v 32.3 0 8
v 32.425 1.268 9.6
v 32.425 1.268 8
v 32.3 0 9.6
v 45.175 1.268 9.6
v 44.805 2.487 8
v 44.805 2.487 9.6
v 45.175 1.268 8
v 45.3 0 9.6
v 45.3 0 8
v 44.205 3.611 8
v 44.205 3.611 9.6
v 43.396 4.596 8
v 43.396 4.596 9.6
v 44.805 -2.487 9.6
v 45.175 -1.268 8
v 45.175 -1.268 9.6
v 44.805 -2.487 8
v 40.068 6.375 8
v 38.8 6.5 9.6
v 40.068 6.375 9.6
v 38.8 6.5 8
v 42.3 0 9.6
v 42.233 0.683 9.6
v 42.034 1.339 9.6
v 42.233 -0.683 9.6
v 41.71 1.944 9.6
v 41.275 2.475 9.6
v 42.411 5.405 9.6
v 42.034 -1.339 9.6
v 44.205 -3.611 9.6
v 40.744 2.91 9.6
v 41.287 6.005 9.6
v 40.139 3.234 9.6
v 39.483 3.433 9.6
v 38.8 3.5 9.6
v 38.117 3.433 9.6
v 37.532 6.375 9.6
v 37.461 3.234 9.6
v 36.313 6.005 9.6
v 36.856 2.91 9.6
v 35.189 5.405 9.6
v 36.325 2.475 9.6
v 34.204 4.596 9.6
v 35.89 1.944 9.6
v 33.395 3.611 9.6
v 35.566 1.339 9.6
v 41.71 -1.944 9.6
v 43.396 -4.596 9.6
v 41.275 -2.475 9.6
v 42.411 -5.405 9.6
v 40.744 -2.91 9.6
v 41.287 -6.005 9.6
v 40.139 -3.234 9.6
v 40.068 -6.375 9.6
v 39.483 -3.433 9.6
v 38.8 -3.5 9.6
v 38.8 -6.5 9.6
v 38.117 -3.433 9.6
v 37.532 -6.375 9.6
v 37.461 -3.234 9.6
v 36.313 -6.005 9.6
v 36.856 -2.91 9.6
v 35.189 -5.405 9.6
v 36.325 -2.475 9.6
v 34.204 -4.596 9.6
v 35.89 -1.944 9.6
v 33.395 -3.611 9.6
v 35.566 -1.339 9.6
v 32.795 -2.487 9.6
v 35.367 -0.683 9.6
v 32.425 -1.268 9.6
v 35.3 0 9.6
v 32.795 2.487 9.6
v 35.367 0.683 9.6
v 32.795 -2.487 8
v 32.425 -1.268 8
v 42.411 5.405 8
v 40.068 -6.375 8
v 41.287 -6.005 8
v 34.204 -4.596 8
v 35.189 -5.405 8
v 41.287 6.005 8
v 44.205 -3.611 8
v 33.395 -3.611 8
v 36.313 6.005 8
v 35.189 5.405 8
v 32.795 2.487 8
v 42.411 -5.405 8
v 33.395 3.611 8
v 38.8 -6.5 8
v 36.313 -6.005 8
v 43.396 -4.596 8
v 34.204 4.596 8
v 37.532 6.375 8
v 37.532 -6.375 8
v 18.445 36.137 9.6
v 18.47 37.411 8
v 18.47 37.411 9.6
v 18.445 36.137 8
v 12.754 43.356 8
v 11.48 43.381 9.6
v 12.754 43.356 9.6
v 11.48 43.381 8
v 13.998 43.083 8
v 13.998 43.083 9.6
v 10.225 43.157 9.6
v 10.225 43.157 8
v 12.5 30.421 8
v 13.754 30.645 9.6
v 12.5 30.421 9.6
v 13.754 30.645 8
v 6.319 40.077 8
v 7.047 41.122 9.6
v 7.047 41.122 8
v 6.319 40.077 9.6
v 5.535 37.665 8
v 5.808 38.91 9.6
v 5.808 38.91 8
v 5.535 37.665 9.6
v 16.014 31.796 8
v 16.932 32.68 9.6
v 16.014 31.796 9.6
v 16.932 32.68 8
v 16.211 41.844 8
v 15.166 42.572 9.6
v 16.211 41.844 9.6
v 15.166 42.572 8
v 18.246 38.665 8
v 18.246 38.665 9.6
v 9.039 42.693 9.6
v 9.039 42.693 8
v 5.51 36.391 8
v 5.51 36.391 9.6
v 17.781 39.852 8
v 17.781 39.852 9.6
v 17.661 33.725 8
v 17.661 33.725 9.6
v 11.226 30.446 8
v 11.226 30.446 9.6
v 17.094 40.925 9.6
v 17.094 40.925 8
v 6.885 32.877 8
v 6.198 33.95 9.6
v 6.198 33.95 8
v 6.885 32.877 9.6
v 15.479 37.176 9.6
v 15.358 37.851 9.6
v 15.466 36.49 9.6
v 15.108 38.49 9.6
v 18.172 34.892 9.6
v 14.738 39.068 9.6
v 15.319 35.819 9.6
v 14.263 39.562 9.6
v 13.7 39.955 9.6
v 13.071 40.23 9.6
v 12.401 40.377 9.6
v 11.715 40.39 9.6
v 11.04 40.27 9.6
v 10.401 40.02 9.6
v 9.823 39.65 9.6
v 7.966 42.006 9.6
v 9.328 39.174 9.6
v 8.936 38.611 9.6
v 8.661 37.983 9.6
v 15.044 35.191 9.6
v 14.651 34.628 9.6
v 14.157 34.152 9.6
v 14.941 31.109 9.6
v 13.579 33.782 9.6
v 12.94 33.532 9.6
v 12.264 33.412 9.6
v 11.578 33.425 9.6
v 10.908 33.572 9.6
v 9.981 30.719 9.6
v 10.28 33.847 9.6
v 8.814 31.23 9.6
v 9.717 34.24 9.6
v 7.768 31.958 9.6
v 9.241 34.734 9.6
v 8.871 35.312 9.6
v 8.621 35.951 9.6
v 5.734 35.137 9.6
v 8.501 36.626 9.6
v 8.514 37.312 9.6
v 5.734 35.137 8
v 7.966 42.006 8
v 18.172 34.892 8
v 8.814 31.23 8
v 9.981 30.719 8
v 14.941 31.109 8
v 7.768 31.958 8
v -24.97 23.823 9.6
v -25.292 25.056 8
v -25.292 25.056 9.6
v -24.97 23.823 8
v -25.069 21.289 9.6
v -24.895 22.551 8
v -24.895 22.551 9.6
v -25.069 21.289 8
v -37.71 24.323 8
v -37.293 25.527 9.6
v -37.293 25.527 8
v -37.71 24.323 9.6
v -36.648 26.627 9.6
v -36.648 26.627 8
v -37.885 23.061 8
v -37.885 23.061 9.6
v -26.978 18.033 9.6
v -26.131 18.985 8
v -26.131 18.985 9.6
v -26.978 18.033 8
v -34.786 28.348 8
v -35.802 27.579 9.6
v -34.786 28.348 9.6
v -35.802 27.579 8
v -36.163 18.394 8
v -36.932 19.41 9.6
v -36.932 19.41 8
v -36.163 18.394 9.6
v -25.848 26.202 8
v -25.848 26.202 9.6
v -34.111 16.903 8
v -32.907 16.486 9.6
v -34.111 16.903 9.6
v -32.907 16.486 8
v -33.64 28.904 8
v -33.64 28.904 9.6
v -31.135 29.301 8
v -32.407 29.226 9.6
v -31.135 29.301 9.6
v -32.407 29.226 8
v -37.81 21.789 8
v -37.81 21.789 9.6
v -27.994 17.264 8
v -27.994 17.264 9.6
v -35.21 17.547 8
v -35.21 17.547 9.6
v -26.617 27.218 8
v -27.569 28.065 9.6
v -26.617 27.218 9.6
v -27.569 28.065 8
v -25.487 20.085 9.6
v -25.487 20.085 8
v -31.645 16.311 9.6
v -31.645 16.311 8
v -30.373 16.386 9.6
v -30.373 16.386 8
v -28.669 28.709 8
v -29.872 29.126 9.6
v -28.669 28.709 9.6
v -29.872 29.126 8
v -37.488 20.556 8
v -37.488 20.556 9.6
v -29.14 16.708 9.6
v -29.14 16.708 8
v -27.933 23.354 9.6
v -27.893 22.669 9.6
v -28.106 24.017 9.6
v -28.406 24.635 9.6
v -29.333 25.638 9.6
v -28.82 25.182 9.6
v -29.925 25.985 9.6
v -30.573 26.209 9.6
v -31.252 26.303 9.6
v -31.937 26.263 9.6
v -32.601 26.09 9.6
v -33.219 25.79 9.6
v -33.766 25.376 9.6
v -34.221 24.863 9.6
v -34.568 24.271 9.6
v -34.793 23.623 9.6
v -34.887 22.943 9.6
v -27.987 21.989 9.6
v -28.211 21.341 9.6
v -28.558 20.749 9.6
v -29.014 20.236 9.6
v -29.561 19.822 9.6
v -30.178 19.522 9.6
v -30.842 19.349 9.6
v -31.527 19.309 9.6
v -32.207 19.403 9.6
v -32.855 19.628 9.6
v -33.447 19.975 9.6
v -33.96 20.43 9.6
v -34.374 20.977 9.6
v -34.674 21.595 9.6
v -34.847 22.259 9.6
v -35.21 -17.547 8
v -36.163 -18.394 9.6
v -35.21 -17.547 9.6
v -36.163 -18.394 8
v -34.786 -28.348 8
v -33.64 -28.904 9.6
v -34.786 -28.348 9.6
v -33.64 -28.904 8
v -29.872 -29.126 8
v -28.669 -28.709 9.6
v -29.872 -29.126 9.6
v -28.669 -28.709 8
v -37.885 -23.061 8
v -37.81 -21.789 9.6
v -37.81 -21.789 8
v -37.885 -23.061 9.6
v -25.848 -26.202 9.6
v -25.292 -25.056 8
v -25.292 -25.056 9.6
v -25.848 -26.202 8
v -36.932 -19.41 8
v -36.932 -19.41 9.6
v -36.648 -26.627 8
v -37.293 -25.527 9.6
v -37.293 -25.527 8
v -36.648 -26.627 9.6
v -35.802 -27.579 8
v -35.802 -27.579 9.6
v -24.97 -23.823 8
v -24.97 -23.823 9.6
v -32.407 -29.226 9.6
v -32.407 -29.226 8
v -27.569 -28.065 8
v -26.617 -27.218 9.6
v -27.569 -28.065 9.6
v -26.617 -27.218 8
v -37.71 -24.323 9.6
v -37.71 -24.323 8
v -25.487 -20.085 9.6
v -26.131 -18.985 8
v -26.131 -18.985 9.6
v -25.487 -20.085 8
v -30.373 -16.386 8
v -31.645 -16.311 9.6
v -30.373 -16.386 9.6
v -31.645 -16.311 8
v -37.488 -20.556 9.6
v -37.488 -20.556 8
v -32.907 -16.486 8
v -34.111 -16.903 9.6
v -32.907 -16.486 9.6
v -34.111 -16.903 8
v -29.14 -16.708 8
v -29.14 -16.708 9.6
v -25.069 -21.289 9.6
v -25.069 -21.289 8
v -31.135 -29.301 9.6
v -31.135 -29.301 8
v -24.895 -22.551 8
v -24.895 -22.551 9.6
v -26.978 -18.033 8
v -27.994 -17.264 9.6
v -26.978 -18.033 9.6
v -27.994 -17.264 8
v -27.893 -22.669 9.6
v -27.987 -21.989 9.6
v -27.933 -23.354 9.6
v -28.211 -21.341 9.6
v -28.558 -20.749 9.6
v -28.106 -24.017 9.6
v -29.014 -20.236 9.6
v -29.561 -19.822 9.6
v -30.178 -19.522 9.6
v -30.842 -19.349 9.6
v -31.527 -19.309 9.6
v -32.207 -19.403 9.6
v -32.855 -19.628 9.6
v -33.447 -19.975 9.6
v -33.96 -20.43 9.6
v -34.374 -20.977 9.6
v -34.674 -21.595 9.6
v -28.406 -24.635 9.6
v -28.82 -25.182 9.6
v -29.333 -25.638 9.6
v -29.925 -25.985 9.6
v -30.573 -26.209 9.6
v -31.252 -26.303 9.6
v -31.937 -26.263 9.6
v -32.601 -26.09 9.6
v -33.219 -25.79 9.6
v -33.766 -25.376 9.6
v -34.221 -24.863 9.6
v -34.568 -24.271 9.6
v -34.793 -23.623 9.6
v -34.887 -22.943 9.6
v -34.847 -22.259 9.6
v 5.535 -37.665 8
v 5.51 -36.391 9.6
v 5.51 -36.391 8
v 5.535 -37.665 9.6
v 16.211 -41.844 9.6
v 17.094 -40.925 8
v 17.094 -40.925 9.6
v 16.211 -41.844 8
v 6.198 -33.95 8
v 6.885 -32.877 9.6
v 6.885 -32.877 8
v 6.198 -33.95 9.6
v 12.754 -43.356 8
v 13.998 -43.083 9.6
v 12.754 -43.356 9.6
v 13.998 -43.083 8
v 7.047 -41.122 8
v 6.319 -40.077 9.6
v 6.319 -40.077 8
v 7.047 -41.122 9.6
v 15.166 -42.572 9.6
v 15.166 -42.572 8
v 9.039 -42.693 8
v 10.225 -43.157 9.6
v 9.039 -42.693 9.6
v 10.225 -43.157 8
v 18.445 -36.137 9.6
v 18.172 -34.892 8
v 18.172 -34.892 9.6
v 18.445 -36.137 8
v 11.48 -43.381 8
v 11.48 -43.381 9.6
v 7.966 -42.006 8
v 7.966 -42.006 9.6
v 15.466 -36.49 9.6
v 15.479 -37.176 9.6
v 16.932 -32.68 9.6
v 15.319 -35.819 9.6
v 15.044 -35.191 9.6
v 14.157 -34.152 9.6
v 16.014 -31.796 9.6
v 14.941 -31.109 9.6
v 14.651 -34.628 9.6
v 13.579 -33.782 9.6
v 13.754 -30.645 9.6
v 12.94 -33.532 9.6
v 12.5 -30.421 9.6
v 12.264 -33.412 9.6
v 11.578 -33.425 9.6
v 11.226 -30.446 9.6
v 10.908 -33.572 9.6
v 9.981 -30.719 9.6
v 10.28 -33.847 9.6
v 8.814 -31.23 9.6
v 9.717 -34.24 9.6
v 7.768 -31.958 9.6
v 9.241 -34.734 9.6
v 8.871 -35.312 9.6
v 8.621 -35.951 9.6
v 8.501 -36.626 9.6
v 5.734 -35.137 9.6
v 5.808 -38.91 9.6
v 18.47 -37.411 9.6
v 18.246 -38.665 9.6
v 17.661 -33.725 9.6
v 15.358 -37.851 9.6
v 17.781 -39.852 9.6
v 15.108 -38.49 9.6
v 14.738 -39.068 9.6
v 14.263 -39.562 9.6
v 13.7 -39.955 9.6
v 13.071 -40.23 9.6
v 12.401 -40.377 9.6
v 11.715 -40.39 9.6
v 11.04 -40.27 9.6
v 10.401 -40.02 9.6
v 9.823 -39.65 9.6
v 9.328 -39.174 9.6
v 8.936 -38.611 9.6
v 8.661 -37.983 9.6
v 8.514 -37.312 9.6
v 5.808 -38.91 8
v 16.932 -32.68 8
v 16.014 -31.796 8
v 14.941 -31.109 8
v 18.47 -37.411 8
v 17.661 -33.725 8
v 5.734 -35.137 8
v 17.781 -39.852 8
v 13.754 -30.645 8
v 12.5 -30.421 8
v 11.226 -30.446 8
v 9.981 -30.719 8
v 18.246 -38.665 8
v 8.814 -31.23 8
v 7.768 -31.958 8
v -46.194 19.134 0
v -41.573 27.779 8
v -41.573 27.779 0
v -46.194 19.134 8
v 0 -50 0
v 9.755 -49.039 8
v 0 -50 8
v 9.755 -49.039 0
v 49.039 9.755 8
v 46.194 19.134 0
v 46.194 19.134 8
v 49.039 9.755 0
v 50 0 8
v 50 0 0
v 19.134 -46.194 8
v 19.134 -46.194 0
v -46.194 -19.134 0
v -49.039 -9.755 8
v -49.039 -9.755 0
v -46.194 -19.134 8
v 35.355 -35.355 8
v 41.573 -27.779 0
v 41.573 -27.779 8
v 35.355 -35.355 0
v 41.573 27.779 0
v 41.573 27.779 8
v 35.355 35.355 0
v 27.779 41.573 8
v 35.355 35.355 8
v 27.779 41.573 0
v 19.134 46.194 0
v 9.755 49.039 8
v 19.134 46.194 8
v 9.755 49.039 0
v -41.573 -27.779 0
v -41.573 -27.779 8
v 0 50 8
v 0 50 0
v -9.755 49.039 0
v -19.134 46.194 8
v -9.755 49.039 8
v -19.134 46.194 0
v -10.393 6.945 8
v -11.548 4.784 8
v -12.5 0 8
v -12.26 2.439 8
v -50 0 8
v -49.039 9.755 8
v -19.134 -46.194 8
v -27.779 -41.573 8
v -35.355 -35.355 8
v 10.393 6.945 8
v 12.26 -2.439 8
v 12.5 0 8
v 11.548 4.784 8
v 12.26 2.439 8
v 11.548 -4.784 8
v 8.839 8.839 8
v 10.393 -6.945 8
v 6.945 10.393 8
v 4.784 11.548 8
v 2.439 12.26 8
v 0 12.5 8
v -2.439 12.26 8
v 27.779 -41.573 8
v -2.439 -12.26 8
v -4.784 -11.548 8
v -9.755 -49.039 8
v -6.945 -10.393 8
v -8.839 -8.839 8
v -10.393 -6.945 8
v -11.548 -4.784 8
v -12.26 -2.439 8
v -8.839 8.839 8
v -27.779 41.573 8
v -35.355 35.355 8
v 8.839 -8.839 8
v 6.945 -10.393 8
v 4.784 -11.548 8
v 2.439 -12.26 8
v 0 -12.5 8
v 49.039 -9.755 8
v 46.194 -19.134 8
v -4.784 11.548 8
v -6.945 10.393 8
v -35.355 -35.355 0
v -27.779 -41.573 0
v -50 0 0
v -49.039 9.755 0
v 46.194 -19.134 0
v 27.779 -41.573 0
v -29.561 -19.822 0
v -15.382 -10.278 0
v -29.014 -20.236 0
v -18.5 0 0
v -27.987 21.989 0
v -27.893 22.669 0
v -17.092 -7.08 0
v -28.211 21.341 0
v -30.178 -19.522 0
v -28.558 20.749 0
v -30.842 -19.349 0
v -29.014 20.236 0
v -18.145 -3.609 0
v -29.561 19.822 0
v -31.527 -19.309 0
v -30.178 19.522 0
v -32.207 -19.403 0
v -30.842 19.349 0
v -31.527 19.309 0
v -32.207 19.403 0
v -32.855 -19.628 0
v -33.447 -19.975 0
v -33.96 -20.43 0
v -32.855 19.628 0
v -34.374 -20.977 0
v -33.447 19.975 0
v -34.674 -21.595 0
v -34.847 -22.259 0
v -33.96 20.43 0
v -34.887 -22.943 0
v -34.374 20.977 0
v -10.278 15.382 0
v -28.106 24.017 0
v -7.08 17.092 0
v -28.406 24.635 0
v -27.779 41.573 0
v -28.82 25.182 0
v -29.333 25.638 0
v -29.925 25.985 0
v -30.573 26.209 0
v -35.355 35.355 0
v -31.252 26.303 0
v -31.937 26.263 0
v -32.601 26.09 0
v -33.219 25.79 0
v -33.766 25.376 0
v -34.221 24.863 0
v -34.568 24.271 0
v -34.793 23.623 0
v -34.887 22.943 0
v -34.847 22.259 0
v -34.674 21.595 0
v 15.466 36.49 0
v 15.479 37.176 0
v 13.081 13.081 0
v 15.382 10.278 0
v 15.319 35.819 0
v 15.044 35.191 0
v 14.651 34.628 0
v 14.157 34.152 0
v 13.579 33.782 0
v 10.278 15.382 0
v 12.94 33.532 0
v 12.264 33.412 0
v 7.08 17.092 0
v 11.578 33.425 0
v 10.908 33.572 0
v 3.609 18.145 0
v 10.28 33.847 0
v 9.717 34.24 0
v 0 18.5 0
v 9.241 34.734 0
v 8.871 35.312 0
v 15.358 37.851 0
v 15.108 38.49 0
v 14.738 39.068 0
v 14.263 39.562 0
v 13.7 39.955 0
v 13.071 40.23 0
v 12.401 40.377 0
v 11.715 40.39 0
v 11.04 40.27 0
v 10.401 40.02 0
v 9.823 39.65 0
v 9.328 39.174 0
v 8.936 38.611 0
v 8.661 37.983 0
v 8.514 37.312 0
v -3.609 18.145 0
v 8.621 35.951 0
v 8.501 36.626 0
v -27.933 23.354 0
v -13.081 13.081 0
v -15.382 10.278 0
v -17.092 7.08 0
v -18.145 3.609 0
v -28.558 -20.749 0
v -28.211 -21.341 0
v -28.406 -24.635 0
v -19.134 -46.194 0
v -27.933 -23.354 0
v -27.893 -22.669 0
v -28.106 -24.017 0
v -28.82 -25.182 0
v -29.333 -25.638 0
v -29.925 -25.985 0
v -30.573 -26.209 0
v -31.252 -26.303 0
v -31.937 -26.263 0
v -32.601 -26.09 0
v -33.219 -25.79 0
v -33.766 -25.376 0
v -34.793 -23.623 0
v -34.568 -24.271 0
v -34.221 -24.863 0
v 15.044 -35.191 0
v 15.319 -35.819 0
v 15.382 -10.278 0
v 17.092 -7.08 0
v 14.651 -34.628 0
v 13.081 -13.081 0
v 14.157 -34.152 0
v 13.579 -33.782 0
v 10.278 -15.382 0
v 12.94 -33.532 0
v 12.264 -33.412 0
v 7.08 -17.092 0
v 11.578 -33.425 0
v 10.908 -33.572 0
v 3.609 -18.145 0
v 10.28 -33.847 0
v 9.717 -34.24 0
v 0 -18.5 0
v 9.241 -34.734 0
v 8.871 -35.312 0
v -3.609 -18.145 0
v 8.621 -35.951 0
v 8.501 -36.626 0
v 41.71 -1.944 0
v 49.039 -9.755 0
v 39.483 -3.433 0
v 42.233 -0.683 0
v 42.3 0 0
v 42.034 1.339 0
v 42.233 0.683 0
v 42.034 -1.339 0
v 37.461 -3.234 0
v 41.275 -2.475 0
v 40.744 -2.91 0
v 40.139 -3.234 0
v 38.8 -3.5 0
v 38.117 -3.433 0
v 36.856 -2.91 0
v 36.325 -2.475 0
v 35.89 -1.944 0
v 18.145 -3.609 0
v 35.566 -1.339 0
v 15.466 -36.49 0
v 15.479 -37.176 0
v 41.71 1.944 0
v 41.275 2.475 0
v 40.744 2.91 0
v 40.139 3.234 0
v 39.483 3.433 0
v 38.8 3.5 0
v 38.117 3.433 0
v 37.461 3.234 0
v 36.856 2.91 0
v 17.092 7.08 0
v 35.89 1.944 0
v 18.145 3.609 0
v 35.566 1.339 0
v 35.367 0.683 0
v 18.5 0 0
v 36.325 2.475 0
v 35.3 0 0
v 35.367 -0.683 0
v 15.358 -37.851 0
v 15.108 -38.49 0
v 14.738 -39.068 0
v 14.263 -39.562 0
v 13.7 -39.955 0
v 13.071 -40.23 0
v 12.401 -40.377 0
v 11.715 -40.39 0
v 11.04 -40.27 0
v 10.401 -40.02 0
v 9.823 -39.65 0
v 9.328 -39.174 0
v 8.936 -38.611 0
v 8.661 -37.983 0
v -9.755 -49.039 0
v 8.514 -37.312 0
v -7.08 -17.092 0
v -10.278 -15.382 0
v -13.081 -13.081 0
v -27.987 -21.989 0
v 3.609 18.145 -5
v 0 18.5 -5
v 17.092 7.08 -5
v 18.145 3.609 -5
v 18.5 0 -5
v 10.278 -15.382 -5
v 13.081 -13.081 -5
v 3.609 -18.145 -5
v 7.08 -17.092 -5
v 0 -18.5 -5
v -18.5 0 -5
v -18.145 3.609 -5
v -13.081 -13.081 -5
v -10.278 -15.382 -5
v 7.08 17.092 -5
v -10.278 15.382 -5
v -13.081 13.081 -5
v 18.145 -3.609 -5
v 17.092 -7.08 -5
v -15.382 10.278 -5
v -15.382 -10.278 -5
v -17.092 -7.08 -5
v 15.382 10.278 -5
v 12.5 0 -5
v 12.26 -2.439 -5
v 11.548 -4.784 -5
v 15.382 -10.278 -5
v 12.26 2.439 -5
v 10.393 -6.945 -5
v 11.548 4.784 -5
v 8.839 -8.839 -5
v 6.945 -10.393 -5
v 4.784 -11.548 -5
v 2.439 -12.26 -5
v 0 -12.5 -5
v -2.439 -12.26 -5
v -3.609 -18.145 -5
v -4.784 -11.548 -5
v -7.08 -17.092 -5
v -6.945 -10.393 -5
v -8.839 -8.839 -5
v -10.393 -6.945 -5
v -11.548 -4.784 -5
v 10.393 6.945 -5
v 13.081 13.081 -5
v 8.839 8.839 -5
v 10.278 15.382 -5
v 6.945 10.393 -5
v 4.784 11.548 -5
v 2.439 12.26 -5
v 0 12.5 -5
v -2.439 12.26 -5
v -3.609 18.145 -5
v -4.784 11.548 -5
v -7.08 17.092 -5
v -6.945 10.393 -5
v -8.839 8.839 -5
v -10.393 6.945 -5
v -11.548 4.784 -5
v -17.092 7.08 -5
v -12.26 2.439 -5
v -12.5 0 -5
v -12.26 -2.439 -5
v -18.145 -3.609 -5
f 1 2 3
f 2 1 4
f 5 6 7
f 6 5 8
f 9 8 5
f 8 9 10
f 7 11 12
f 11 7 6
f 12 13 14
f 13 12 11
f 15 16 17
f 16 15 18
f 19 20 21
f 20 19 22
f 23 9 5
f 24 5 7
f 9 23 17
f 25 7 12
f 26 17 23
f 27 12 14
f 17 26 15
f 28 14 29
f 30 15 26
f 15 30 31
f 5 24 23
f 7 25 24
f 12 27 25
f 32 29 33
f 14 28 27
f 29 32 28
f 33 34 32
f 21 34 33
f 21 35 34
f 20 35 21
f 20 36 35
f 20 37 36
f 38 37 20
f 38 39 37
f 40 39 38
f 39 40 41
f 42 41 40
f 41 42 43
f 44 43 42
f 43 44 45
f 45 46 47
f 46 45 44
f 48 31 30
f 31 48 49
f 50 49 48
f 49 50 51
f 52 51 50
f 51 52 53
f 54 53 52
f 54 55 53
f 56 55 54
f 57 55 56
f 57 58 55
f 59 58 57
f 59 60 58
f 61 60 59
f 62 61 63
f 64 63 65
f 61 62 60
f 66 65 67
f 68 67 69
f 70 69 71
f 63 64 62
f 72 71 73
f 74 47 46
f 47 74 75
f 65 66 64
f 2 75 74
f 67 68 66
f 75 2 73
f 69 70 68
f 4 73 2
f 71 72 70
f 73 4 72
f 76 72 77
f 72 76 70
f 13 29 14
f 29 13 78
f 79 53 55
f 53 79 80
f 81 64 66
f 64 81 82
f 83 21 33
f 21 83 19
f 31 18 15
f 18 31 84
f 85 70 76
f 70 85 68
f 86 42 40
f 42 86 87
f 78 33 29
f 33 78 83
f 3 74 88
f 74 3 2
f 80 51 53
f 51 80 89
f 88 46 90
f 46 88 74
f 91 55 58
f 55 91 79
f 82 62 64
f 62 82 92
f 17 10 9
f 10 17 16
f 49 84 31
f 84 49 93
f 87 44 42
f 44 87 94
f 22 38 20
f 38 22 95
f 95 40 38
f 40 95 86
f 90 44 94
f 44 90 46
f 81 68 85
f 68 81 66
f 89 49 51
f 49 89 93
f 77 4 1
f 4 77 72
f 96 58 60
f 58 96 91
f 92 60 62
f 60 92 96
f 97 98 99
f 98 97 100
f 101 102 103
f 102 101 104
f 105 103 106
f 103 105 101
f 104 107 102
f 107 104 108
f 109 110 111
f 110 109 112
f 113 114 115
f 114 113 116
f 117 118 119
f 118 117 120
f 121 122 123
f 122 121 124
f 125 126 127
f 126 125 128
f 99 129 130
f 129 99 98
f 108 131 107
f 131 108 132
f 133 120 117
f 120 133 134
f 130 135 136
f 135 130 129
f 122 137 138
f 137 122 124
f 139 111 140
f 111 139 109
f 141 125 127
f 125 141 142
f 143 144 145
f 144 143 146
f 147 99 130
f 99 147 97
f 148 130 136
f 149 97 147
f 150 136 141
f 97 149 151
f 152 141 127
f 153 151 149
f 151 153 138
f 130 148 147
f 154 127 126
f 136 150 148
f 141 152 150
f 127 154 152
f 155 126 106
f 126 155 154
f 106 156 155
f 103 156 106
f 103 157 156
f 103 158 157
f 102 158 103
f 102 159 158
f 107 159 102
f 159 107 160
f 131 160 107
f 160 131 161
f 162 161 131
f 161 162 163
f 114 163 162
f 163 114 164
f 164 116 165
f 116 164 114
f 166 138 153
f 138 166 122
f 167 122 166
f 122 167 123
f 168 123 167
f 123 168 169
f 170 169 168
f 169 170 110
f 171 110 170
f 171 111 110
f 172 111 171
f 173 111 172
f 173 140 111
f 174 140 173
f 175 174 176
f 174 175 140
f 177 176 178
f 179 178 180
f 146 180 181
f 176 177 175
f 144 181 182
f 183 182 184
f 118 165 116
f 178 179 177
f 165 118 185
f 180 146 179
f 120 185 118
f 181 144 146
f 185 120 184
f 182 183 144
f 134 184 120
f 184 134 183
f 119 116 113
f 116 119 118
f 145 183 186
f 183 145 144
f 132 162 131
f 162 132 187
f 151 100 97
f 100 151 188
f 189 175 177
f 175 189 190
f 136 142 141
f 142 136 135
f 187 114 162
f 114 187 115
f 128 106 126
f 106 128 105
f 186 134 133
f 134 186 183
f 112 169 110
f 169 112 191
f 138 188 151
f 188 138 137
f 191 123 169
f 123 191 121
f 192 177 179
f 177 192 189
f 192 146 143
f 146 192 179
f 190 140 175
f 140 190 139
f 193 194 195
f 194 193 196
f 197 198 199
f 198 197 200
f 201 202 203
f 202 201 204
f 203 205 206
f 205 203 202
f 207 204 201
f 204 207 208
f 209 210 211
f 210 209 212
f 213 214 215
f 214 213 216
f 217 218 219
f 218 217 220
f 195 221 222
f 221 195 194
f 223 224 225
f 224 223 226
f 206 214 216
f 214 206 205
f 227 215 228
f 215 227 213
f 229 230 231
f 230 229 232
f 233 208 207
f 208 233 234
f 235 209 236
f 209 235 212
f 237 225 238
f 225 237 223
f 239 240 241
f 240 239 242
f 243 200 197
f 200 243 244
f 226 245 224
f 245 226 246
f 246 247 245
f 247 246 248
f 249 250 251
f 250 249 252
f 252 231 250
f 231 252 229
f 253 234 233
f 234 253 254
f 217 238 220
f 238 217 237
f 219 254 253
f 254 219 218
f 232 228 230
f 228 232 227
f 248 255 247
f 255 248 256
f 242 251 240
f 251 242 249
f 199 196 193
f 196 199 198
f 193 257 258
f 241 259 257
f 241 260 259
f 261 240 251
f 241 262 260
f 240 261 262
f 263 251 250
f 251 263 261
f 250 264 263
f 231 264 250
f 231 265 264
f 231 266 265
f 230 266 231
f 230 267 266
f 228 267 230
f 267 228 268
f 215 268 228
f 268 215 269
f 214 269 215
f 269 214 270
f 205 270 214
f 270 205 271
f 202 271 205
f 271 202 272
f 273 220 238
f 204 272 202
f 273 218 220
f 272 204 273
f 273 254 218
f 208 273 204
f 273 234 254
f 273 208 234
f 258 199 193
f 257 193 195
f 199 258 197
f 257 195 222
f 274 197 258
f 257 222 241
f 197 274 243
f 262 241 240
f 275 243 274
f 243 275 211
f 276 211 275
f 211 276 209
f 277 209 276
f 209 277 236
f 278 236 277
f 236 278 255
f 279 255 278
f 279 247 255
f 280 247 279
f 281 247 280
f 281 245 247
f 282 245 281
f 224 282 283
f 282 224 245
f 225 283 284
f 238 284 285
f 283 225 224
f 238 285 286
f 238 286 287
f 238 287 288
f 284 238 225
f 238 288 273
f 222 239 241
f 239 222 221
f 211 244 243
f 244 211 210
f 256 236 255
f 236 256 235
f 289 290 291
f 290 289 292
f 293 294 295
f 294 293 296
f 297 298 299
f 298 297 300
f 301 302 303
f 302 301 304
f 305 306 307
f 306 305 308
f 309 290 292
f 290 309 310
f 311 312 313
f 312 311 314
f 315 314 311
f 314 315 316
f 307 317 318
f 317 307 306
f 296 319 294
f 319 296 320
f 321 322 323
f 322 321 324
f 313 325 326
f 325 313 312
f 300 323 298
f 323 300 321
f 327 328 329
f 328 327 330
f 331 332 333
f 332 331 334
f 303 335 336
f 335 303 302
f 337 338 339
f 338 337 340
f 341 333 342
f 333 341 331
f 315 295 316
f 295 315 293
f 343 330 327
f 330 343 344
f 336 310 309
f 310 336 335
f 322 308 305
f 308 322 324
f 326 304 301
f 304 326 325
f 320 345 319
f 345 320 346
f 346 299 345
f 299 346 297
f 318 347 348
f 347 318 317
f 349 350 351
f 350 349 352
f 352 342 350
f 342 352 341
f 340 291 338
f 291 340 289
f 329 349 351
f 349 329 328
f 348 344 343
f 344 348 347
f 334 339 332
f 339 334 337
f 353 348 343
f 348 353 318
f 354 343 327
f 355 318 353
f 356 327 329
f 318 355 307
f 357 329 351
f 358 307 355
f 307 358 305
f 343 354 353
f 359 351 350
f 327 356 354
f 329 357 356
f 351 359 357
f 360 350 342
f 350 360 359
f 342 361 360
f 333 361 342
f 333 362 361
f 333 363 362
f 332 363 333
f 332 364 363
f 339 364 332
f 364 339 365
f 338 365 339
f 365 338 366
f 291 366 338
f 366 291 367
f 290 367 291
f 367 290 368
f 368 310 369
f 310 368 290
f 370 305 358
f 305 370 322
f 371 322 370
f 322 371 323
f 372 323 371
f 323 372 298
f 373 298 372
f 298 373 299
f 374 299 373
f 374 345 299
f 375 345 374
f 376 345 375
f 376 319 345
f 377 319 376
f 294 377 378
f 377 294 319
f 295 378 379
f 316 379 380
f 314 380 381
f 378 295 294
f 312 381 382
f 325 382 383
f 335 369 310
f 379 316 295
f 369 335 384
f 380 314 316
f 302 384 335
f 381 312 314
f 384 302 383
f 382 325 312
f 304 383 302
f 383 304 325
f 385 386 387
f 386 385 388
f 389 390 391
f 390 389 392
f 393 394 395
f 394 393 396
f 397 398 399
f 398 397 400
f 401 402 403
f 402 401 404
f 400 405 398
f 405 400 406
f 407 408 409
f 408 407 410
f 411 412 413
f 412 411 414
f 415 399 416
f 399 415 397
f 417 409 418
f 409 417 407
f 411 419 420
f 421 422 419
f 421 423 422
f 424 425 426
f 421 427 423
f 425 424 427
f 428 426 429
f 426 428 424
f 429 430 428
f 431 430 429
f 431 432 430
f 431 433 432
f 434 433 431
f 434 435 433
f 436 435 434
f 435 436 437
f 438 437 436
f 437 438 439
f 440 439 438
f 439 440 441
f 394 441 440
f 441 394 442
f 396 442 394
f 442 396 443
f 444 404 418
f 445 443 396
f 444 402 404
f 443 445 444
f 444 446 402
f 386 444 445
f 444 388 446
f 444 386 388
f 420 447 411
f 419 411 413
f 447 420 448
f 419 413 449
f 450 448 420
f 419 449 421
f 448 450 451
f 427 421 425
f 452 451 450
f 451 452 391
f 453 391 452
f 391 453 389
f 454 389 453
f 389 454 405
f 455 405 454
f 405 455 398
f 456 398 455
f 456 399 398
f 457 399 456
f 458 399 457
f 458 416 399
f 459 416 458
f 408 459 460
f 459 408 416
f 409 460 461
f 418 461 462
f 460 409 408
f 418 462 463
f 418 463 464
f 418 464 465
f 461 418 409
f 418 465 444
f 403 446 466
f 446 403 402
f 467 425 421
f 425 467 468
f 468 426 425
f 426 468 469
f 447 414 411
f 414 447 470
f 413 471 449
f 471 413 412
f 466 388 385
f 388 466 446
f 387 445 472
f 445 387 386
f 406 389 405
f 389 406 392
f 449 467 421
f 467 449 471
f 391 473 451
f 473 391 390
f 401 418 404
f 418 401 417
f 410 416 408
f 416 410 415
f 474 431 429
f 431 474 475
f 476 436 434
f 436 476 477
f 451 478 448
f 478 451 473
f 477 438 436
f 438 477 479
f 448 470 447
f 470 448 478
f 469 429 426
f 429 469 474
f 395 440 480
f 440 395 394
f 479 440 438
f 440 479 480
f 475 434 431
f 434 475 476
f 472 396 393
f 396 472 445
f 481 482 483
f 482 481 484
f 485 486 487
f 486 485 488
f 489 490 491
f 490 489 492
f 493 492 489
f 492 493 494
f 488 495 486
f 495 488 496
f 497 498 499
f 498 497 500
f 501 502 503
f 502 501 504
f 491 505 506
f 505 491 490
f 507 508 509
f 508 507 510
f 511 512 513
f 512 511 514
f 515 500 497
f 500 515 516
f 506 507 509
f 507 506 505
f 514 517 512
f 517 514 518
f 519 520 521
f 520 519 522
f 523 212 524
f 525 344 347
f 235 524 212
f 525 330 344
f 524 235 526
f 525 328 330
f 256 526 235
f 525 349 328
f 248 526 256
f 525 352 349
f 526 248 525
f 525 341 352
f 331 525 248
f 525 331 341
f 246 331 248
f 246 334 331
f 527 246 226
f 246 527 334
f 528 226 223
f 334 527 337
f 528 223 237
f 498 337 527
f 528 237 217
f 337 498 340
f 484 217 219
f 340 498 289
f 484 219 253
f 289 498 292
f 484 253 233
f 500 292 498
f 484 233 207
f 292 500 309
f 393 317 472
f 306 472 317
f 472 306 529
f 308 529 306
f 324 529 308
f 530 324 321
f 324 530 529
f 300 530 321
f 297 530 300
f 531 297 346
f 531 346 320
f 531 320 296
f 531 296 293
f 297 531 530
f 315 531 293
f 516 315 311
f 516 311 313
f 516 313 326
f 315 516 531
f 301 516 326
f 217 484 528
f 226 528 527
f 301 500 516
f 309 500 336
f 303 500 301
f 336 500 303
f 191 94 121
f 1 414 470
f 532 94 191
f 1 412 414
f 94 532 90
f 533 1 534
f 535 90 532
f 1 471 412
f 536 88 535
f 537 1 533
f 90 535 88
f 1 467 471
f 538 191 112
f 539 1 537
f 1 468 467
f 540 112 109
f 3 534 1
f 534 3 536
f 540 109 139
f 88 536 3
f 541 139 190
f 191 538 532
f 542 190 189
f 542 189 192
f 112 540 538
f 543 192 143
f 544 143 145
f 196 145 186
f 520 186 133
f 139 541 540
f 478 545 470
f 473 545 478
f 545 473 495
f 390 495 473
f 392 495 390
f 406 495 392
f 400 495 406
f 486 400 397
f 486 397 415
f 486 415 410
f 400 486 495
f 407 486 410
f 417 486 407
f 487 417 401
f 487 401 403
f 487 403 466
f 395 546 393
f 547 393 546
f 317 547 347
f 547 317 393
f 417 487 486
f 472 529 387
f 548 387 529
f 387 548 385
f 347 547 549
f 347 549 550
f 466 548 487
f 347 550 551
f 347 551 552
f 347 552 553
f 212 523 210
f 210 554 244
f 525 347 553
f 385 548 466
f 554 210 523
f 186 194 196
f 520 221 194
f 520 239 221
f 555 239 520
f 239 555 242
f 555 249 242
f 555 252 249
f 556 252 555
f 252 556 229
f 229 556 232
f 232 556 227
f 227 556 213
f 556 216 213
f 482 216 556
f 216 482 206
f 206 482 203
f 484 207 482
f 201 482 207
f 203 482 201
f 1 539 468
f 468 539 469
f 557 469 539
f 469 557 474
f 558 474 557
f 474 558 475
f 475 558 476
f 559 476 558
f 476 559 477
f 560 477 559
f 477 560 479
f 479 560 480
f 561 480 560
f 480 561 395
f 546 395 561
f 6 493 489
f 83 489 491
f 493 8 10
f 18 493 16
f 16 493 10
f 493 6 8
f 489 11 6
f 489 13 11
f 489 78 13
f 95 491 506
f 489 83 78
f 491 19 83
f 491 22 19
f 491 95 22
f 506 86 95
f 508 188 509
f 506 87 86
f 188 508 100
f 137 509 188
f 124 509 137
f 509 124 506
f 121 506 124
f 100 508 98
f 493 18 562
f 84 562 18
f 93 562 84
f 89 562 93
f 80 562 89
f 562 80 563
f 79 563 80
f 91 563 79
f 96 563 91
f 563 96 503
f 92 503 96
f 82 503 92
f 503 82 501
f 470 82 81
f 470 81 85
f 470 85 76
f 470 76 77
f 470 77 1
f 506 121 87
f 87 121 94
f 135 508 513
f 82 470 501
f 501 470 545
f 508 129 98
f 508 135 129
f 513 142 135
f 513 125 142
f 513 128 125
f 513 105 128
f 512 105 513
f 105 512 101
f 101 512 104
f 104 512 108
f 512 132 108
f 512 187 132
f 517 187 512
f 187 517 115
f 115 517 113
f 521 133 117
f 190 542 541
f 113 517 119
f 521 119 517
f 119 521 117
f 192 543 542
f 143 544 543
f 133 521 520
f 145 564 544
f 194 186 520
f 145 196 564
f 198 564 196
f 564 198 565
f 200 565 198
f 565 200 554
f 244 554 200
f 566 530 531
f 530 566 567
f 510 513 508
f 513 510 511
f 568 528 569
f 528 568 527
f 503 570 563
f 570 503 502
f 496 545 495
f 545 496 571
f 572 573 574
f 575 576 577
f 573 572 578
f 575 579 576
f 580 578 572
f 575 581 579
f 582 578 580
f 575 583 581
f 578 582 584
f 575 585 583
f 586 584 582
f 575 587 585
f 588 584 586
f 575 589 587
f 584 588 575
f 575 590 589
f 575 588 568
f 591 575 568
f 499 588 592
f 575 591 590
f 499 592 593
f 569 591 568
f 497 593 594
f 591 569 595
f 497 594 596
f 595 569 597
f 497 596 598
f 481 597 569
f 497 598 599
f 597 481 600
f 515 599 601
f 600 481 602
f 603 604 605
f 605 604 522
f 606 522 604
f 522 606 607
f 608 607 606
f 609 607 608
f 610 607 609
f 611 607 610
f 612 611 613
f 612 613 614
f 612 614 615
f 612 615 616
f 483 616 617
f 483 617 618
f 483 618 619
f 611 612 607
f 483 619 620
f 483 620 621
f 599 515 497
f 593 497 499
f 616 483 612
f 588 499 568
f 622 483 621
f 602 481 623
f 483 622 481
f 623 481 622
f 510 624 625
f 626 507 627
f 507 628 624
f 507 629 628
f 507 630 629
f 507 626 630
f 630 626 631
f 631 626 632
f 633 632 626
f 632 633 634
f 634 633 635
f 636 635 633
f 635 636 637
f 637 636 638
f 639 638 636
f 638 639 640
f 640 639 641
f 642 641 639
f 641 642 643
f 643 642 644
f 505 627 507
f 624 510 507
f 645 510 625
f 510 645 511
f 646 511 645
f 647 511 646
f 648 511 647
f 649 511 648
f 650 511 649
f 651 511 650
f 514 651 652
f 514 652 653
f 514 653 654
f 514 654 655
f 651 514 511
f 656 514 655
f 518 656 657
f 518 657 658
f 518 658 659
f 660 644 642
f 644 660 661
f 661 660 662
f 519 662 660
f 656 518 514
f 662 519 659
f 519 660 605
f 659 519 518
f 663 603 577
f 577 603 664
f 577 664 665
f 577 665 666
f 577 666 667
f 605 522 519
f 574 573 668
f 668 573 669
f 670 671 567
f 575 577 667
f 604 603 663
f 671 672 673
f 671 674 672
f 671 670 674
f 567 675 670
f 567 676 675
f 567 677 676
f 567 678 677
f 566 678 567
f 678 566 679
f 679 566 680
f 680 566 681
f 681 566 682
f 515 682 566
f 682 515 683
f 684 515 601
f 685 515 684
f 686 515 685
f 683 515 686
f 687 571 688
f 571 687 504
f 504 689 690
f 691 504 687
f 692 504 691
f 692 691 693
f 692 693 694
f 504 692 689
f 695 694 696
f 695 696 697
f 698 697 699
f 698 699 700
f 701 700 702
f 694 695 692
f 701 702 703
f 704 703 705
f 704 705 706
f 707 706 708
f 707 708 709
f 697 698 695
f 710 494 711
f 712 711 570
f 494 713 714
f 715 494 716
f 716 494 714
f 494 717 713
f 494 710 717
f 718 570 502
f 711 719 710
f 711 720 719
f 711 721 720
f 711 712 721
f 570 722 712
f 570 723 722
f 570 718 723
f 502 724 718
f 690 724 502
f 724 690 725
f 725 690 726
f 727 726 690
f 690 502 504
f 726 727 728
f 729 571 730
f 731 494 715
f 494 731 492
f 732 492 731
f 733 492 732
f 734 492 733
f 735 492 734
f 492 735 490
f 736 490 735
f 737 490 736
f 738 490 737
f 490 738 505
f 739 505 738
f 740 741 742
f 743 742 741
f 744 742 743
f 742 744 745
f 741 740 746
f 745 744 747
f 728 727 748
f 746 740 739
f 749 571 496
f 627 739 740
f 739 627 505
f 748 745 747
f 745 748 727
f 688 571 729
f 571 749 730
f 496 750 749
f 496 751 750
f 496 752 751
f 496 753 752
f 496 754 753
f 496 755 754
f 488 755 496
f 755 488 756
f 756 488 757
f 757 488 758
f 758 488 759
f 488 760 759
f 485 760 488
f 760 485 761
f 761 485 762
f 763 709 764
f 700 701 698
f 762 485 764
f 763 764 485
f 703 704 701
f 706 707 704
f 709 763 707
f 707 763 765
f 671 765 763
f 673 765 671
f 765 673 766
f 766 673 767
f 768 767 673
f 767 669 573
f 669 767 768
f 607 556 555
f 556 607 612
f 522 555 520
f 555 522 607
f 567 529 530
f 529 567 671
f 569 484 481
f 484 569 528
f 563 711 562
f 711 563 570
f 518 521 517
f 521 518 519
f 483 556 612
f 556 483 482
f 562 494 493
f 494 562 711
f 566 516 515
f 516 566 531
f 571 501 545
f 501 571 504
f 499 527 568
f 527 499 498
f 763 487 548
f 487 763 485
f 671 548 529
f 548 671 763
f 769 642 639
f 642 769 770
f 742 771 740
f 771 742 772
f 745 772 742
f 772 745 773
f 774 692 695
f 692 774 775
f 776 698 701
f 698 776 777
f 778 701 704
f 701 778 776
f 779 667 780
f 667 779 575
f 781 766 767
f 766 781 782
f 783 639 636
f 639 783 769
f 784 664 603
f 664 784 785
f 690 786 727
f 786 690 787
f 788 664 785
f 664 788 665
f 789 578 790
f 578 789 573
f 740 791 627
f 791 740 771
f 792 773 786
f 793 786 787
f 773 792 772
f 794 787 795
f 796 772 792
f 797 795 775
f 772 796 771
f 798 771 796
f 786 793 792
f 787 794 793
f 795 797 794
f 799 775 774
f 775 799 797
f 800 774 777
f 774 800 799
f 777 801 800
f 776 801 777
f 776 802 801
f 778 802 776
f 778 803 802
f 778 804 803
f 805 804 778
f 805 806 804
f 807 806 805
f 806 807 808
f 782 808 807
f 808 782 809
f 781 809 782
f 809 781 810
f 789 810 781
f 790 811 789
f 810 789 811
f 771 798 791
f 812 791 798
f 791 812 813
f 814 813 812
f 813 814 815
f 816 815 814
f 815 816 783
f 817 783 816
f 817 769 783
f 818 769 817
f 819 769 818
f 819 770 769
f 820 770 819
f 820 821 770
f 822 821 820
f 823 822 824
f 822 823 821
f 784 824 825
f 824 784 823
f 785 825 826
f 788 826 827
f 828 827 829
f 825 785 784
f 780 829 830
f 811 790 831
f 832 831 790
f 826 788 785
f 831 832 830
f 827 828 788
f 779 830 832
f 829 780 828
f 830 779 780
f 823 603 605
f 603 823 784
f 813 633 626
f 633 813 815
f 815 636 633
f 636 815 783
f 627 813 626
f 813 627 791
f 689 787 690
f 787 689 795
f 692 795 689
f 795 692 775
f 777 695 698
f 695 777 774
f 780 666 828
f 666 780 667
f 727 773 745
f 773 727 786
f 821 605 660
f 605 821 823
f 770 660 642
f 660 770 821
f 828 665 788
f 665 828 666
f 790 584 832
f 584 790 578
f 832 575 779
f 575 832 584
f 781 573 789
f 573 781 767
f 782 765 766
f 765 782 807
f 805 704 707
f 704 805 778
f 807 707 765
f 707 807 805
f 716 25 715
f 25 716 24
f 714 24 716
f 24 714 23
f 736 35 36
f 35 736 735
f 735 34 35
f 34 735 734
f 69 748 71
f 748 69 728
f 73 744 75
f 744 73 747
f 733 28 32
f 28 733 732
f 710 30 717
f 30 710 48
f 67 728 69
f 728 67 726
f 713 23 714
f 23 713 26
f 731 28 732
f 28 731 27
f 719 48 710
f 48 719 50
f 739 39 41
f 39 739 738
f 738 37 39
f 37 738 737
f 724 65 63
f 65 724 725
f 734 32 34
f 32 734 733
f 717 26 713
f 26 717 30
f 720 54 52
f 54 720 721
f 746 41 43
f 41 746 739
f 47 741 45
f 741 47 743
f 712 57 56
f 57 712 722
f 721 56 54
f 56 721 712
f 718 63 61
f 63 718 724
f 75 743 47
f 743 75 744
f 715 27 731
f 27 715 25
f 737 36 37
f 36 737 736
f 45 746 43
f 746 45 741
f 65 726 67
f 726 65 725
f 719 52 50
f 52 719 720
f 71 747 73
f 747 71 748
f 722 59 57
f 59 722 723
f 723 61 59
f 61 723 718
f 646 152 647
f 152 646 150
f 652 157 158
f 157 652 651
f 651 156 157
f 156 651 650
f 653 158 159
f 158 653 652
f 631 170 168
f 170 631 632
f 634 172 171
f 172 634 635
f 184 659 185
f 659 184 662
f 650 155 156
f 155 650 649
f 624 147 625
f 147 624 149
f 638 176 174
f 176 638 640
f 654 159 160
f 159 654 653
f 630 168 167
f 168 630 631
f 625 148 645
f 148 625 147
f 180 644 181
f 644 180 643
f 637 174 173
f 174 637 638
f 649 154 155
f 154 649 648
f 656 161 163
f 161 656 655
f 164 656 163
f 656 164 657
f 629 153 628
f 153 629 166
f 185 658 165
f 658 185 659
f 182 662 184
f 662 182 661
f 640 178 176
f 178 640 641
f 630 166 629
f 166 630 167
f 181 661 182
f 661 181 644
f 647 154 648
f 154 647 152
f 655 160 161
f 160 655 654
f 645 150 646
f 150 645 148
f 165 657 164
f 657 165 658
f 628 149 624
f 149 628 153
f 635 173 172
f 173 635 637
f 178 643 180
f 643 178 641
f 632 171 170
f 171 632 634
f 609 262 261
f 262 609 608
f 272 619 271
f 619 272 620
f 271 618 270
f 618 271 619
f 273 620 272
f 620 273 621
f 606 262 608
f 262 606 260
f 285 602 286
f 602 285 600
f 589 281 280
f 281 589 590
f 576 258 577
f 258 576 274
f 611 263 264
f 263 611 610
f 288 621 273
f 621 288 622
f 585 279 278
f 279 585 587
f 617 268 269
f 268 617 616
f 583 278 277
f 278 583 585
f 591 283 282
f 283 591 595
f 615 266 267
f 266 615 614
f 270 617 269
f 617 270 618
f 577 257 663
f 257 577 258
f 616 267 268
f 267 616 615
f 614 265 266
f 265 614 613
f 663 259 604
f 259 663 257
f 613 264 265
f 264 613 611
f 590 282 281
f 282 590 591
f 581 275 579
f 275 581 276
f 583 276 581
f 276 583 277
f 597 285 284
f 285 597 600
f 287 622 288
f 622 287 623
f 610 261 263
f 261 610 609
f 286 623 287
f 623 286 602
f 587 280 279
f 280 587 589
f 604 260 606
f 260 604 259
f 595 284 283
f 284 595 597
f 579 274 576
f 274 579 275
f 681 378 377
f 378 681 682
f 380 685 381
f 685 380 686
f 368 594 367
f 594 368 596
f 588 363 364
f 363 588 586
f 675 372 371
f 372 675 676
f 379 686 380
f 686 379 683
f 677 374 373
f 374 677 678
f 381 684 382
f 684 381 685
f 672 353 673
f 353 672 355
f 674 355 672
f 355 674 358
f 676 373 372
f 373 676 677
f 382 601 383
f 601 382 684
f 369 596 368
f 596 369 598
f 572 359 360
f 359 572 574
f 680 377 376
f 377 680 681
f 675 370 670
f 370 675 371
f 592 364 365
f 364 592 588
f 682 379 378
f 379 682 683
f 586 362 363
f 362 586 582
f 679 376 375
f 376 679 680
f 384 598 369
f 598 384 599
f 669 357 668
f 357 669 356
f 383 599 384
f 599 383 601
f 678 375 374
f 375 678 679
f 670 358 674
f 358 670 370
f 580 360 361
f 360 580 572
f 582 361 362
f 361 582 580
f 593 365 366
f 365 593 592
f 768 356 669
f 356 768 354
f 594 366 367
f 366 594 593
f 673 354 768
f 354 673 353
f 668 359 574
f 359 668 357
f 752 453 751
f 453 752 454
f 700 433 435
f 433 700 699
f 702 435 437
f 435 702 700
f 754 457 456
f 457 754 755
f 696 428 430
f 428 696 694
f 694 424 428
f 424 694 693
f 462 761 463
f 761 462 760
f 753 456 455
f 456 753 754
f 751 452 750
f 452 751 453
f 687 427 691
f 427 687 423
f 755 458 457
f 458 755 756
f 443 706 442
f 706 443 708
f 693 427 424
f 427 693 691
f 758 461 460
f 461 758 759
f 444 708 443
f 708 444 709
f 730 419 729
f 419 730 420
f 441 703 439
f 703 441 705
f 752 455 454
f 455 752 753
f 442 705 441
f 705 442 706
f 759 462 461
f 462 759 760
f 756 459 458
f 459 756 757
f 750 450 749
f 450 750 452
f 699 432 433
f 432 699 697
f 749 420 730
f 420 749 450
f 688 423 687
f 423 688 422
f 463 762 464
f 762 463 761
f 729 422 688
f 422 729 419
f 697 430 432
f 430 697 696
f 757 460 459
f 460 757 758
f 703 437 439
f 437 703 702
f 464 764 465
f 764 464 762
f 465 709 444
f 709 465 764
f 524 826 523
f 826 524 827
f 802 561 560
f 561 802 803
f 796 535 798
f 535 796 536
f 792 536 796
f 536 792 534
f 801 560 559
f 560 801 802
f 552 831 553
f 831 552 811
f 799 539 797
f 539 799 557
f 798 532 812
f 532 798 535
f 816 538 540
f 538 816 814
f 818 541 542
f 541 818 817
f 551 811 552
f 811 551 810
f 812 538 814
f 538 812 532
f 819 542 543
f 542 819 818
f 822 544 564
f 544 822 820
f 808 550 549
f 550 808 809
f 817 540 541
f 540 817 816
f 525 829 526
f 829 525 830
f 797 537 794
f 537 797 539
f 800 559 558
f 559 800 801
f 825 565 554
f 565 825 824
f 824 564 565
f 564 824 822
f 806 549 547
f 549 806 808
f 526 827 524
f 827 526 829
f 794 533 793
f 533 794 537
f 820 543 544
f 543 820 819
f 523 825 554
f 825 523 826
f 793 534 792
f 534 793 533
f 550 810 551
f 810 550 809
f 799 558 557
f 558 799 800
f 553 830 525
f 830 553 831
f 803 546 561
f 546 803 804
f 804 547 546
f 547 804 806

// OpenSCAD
$fn = 32;

// ----------------------------------------------------------------------
// Bolt-circle flange: 100 mm outside, 5 bolt holes, bore 25 mm
// ----------------------------------------------------------------------

// --- parameters (mm) ---
flange_d = 100;           // flange outside diameter
flange_t = 8;             // flange thickness
bolts = 5;                // number of bolt holes
bolt_d = 7;               // bolt clearance
bolt_r = 38.8;            // bolt circle radius
bore_d = 25;              // centre bore
spigot_d = 37;            // spigot diameter
spigot_h = 6;             // spigot height below the flange
sink = 1;                 // overlap into the flange
spot_d = 13;              // spot faced bosses
spot_h = 1.6;             // spot face height

module body() {
  cylinder(h = flange_t, d = flange_d);
  /* spigot on the back face, sunk into the flange */
  translate([0, 0, -spigot_h + sink]) cylinder(h = spigot_h, d = spigot_d);
  /* spot faced pads under the bolt heads */
  for (i = [0 : bolts - 1]) rotate([0, 0, i * 360 / bolts]) translate([bolt_r, 0, flange_t - 1]) cylinder(h = spot_h + 1, d = spot_d);
}

difference() {
  body();
  /* bolt circle */
  for (i = [0 : bolts - 1]) rotate([0, 0, i * 360 / bolts]) translate([bolt_r, 0, -spigot_h - 1]) cylinder(h = flange_t + spigot_h + 3, d = bolt_d);
  translate([0, 0, -spigot_h - 1]) cylinder(h = flange_t + spigot_h + 3, d = bore_d);
}
